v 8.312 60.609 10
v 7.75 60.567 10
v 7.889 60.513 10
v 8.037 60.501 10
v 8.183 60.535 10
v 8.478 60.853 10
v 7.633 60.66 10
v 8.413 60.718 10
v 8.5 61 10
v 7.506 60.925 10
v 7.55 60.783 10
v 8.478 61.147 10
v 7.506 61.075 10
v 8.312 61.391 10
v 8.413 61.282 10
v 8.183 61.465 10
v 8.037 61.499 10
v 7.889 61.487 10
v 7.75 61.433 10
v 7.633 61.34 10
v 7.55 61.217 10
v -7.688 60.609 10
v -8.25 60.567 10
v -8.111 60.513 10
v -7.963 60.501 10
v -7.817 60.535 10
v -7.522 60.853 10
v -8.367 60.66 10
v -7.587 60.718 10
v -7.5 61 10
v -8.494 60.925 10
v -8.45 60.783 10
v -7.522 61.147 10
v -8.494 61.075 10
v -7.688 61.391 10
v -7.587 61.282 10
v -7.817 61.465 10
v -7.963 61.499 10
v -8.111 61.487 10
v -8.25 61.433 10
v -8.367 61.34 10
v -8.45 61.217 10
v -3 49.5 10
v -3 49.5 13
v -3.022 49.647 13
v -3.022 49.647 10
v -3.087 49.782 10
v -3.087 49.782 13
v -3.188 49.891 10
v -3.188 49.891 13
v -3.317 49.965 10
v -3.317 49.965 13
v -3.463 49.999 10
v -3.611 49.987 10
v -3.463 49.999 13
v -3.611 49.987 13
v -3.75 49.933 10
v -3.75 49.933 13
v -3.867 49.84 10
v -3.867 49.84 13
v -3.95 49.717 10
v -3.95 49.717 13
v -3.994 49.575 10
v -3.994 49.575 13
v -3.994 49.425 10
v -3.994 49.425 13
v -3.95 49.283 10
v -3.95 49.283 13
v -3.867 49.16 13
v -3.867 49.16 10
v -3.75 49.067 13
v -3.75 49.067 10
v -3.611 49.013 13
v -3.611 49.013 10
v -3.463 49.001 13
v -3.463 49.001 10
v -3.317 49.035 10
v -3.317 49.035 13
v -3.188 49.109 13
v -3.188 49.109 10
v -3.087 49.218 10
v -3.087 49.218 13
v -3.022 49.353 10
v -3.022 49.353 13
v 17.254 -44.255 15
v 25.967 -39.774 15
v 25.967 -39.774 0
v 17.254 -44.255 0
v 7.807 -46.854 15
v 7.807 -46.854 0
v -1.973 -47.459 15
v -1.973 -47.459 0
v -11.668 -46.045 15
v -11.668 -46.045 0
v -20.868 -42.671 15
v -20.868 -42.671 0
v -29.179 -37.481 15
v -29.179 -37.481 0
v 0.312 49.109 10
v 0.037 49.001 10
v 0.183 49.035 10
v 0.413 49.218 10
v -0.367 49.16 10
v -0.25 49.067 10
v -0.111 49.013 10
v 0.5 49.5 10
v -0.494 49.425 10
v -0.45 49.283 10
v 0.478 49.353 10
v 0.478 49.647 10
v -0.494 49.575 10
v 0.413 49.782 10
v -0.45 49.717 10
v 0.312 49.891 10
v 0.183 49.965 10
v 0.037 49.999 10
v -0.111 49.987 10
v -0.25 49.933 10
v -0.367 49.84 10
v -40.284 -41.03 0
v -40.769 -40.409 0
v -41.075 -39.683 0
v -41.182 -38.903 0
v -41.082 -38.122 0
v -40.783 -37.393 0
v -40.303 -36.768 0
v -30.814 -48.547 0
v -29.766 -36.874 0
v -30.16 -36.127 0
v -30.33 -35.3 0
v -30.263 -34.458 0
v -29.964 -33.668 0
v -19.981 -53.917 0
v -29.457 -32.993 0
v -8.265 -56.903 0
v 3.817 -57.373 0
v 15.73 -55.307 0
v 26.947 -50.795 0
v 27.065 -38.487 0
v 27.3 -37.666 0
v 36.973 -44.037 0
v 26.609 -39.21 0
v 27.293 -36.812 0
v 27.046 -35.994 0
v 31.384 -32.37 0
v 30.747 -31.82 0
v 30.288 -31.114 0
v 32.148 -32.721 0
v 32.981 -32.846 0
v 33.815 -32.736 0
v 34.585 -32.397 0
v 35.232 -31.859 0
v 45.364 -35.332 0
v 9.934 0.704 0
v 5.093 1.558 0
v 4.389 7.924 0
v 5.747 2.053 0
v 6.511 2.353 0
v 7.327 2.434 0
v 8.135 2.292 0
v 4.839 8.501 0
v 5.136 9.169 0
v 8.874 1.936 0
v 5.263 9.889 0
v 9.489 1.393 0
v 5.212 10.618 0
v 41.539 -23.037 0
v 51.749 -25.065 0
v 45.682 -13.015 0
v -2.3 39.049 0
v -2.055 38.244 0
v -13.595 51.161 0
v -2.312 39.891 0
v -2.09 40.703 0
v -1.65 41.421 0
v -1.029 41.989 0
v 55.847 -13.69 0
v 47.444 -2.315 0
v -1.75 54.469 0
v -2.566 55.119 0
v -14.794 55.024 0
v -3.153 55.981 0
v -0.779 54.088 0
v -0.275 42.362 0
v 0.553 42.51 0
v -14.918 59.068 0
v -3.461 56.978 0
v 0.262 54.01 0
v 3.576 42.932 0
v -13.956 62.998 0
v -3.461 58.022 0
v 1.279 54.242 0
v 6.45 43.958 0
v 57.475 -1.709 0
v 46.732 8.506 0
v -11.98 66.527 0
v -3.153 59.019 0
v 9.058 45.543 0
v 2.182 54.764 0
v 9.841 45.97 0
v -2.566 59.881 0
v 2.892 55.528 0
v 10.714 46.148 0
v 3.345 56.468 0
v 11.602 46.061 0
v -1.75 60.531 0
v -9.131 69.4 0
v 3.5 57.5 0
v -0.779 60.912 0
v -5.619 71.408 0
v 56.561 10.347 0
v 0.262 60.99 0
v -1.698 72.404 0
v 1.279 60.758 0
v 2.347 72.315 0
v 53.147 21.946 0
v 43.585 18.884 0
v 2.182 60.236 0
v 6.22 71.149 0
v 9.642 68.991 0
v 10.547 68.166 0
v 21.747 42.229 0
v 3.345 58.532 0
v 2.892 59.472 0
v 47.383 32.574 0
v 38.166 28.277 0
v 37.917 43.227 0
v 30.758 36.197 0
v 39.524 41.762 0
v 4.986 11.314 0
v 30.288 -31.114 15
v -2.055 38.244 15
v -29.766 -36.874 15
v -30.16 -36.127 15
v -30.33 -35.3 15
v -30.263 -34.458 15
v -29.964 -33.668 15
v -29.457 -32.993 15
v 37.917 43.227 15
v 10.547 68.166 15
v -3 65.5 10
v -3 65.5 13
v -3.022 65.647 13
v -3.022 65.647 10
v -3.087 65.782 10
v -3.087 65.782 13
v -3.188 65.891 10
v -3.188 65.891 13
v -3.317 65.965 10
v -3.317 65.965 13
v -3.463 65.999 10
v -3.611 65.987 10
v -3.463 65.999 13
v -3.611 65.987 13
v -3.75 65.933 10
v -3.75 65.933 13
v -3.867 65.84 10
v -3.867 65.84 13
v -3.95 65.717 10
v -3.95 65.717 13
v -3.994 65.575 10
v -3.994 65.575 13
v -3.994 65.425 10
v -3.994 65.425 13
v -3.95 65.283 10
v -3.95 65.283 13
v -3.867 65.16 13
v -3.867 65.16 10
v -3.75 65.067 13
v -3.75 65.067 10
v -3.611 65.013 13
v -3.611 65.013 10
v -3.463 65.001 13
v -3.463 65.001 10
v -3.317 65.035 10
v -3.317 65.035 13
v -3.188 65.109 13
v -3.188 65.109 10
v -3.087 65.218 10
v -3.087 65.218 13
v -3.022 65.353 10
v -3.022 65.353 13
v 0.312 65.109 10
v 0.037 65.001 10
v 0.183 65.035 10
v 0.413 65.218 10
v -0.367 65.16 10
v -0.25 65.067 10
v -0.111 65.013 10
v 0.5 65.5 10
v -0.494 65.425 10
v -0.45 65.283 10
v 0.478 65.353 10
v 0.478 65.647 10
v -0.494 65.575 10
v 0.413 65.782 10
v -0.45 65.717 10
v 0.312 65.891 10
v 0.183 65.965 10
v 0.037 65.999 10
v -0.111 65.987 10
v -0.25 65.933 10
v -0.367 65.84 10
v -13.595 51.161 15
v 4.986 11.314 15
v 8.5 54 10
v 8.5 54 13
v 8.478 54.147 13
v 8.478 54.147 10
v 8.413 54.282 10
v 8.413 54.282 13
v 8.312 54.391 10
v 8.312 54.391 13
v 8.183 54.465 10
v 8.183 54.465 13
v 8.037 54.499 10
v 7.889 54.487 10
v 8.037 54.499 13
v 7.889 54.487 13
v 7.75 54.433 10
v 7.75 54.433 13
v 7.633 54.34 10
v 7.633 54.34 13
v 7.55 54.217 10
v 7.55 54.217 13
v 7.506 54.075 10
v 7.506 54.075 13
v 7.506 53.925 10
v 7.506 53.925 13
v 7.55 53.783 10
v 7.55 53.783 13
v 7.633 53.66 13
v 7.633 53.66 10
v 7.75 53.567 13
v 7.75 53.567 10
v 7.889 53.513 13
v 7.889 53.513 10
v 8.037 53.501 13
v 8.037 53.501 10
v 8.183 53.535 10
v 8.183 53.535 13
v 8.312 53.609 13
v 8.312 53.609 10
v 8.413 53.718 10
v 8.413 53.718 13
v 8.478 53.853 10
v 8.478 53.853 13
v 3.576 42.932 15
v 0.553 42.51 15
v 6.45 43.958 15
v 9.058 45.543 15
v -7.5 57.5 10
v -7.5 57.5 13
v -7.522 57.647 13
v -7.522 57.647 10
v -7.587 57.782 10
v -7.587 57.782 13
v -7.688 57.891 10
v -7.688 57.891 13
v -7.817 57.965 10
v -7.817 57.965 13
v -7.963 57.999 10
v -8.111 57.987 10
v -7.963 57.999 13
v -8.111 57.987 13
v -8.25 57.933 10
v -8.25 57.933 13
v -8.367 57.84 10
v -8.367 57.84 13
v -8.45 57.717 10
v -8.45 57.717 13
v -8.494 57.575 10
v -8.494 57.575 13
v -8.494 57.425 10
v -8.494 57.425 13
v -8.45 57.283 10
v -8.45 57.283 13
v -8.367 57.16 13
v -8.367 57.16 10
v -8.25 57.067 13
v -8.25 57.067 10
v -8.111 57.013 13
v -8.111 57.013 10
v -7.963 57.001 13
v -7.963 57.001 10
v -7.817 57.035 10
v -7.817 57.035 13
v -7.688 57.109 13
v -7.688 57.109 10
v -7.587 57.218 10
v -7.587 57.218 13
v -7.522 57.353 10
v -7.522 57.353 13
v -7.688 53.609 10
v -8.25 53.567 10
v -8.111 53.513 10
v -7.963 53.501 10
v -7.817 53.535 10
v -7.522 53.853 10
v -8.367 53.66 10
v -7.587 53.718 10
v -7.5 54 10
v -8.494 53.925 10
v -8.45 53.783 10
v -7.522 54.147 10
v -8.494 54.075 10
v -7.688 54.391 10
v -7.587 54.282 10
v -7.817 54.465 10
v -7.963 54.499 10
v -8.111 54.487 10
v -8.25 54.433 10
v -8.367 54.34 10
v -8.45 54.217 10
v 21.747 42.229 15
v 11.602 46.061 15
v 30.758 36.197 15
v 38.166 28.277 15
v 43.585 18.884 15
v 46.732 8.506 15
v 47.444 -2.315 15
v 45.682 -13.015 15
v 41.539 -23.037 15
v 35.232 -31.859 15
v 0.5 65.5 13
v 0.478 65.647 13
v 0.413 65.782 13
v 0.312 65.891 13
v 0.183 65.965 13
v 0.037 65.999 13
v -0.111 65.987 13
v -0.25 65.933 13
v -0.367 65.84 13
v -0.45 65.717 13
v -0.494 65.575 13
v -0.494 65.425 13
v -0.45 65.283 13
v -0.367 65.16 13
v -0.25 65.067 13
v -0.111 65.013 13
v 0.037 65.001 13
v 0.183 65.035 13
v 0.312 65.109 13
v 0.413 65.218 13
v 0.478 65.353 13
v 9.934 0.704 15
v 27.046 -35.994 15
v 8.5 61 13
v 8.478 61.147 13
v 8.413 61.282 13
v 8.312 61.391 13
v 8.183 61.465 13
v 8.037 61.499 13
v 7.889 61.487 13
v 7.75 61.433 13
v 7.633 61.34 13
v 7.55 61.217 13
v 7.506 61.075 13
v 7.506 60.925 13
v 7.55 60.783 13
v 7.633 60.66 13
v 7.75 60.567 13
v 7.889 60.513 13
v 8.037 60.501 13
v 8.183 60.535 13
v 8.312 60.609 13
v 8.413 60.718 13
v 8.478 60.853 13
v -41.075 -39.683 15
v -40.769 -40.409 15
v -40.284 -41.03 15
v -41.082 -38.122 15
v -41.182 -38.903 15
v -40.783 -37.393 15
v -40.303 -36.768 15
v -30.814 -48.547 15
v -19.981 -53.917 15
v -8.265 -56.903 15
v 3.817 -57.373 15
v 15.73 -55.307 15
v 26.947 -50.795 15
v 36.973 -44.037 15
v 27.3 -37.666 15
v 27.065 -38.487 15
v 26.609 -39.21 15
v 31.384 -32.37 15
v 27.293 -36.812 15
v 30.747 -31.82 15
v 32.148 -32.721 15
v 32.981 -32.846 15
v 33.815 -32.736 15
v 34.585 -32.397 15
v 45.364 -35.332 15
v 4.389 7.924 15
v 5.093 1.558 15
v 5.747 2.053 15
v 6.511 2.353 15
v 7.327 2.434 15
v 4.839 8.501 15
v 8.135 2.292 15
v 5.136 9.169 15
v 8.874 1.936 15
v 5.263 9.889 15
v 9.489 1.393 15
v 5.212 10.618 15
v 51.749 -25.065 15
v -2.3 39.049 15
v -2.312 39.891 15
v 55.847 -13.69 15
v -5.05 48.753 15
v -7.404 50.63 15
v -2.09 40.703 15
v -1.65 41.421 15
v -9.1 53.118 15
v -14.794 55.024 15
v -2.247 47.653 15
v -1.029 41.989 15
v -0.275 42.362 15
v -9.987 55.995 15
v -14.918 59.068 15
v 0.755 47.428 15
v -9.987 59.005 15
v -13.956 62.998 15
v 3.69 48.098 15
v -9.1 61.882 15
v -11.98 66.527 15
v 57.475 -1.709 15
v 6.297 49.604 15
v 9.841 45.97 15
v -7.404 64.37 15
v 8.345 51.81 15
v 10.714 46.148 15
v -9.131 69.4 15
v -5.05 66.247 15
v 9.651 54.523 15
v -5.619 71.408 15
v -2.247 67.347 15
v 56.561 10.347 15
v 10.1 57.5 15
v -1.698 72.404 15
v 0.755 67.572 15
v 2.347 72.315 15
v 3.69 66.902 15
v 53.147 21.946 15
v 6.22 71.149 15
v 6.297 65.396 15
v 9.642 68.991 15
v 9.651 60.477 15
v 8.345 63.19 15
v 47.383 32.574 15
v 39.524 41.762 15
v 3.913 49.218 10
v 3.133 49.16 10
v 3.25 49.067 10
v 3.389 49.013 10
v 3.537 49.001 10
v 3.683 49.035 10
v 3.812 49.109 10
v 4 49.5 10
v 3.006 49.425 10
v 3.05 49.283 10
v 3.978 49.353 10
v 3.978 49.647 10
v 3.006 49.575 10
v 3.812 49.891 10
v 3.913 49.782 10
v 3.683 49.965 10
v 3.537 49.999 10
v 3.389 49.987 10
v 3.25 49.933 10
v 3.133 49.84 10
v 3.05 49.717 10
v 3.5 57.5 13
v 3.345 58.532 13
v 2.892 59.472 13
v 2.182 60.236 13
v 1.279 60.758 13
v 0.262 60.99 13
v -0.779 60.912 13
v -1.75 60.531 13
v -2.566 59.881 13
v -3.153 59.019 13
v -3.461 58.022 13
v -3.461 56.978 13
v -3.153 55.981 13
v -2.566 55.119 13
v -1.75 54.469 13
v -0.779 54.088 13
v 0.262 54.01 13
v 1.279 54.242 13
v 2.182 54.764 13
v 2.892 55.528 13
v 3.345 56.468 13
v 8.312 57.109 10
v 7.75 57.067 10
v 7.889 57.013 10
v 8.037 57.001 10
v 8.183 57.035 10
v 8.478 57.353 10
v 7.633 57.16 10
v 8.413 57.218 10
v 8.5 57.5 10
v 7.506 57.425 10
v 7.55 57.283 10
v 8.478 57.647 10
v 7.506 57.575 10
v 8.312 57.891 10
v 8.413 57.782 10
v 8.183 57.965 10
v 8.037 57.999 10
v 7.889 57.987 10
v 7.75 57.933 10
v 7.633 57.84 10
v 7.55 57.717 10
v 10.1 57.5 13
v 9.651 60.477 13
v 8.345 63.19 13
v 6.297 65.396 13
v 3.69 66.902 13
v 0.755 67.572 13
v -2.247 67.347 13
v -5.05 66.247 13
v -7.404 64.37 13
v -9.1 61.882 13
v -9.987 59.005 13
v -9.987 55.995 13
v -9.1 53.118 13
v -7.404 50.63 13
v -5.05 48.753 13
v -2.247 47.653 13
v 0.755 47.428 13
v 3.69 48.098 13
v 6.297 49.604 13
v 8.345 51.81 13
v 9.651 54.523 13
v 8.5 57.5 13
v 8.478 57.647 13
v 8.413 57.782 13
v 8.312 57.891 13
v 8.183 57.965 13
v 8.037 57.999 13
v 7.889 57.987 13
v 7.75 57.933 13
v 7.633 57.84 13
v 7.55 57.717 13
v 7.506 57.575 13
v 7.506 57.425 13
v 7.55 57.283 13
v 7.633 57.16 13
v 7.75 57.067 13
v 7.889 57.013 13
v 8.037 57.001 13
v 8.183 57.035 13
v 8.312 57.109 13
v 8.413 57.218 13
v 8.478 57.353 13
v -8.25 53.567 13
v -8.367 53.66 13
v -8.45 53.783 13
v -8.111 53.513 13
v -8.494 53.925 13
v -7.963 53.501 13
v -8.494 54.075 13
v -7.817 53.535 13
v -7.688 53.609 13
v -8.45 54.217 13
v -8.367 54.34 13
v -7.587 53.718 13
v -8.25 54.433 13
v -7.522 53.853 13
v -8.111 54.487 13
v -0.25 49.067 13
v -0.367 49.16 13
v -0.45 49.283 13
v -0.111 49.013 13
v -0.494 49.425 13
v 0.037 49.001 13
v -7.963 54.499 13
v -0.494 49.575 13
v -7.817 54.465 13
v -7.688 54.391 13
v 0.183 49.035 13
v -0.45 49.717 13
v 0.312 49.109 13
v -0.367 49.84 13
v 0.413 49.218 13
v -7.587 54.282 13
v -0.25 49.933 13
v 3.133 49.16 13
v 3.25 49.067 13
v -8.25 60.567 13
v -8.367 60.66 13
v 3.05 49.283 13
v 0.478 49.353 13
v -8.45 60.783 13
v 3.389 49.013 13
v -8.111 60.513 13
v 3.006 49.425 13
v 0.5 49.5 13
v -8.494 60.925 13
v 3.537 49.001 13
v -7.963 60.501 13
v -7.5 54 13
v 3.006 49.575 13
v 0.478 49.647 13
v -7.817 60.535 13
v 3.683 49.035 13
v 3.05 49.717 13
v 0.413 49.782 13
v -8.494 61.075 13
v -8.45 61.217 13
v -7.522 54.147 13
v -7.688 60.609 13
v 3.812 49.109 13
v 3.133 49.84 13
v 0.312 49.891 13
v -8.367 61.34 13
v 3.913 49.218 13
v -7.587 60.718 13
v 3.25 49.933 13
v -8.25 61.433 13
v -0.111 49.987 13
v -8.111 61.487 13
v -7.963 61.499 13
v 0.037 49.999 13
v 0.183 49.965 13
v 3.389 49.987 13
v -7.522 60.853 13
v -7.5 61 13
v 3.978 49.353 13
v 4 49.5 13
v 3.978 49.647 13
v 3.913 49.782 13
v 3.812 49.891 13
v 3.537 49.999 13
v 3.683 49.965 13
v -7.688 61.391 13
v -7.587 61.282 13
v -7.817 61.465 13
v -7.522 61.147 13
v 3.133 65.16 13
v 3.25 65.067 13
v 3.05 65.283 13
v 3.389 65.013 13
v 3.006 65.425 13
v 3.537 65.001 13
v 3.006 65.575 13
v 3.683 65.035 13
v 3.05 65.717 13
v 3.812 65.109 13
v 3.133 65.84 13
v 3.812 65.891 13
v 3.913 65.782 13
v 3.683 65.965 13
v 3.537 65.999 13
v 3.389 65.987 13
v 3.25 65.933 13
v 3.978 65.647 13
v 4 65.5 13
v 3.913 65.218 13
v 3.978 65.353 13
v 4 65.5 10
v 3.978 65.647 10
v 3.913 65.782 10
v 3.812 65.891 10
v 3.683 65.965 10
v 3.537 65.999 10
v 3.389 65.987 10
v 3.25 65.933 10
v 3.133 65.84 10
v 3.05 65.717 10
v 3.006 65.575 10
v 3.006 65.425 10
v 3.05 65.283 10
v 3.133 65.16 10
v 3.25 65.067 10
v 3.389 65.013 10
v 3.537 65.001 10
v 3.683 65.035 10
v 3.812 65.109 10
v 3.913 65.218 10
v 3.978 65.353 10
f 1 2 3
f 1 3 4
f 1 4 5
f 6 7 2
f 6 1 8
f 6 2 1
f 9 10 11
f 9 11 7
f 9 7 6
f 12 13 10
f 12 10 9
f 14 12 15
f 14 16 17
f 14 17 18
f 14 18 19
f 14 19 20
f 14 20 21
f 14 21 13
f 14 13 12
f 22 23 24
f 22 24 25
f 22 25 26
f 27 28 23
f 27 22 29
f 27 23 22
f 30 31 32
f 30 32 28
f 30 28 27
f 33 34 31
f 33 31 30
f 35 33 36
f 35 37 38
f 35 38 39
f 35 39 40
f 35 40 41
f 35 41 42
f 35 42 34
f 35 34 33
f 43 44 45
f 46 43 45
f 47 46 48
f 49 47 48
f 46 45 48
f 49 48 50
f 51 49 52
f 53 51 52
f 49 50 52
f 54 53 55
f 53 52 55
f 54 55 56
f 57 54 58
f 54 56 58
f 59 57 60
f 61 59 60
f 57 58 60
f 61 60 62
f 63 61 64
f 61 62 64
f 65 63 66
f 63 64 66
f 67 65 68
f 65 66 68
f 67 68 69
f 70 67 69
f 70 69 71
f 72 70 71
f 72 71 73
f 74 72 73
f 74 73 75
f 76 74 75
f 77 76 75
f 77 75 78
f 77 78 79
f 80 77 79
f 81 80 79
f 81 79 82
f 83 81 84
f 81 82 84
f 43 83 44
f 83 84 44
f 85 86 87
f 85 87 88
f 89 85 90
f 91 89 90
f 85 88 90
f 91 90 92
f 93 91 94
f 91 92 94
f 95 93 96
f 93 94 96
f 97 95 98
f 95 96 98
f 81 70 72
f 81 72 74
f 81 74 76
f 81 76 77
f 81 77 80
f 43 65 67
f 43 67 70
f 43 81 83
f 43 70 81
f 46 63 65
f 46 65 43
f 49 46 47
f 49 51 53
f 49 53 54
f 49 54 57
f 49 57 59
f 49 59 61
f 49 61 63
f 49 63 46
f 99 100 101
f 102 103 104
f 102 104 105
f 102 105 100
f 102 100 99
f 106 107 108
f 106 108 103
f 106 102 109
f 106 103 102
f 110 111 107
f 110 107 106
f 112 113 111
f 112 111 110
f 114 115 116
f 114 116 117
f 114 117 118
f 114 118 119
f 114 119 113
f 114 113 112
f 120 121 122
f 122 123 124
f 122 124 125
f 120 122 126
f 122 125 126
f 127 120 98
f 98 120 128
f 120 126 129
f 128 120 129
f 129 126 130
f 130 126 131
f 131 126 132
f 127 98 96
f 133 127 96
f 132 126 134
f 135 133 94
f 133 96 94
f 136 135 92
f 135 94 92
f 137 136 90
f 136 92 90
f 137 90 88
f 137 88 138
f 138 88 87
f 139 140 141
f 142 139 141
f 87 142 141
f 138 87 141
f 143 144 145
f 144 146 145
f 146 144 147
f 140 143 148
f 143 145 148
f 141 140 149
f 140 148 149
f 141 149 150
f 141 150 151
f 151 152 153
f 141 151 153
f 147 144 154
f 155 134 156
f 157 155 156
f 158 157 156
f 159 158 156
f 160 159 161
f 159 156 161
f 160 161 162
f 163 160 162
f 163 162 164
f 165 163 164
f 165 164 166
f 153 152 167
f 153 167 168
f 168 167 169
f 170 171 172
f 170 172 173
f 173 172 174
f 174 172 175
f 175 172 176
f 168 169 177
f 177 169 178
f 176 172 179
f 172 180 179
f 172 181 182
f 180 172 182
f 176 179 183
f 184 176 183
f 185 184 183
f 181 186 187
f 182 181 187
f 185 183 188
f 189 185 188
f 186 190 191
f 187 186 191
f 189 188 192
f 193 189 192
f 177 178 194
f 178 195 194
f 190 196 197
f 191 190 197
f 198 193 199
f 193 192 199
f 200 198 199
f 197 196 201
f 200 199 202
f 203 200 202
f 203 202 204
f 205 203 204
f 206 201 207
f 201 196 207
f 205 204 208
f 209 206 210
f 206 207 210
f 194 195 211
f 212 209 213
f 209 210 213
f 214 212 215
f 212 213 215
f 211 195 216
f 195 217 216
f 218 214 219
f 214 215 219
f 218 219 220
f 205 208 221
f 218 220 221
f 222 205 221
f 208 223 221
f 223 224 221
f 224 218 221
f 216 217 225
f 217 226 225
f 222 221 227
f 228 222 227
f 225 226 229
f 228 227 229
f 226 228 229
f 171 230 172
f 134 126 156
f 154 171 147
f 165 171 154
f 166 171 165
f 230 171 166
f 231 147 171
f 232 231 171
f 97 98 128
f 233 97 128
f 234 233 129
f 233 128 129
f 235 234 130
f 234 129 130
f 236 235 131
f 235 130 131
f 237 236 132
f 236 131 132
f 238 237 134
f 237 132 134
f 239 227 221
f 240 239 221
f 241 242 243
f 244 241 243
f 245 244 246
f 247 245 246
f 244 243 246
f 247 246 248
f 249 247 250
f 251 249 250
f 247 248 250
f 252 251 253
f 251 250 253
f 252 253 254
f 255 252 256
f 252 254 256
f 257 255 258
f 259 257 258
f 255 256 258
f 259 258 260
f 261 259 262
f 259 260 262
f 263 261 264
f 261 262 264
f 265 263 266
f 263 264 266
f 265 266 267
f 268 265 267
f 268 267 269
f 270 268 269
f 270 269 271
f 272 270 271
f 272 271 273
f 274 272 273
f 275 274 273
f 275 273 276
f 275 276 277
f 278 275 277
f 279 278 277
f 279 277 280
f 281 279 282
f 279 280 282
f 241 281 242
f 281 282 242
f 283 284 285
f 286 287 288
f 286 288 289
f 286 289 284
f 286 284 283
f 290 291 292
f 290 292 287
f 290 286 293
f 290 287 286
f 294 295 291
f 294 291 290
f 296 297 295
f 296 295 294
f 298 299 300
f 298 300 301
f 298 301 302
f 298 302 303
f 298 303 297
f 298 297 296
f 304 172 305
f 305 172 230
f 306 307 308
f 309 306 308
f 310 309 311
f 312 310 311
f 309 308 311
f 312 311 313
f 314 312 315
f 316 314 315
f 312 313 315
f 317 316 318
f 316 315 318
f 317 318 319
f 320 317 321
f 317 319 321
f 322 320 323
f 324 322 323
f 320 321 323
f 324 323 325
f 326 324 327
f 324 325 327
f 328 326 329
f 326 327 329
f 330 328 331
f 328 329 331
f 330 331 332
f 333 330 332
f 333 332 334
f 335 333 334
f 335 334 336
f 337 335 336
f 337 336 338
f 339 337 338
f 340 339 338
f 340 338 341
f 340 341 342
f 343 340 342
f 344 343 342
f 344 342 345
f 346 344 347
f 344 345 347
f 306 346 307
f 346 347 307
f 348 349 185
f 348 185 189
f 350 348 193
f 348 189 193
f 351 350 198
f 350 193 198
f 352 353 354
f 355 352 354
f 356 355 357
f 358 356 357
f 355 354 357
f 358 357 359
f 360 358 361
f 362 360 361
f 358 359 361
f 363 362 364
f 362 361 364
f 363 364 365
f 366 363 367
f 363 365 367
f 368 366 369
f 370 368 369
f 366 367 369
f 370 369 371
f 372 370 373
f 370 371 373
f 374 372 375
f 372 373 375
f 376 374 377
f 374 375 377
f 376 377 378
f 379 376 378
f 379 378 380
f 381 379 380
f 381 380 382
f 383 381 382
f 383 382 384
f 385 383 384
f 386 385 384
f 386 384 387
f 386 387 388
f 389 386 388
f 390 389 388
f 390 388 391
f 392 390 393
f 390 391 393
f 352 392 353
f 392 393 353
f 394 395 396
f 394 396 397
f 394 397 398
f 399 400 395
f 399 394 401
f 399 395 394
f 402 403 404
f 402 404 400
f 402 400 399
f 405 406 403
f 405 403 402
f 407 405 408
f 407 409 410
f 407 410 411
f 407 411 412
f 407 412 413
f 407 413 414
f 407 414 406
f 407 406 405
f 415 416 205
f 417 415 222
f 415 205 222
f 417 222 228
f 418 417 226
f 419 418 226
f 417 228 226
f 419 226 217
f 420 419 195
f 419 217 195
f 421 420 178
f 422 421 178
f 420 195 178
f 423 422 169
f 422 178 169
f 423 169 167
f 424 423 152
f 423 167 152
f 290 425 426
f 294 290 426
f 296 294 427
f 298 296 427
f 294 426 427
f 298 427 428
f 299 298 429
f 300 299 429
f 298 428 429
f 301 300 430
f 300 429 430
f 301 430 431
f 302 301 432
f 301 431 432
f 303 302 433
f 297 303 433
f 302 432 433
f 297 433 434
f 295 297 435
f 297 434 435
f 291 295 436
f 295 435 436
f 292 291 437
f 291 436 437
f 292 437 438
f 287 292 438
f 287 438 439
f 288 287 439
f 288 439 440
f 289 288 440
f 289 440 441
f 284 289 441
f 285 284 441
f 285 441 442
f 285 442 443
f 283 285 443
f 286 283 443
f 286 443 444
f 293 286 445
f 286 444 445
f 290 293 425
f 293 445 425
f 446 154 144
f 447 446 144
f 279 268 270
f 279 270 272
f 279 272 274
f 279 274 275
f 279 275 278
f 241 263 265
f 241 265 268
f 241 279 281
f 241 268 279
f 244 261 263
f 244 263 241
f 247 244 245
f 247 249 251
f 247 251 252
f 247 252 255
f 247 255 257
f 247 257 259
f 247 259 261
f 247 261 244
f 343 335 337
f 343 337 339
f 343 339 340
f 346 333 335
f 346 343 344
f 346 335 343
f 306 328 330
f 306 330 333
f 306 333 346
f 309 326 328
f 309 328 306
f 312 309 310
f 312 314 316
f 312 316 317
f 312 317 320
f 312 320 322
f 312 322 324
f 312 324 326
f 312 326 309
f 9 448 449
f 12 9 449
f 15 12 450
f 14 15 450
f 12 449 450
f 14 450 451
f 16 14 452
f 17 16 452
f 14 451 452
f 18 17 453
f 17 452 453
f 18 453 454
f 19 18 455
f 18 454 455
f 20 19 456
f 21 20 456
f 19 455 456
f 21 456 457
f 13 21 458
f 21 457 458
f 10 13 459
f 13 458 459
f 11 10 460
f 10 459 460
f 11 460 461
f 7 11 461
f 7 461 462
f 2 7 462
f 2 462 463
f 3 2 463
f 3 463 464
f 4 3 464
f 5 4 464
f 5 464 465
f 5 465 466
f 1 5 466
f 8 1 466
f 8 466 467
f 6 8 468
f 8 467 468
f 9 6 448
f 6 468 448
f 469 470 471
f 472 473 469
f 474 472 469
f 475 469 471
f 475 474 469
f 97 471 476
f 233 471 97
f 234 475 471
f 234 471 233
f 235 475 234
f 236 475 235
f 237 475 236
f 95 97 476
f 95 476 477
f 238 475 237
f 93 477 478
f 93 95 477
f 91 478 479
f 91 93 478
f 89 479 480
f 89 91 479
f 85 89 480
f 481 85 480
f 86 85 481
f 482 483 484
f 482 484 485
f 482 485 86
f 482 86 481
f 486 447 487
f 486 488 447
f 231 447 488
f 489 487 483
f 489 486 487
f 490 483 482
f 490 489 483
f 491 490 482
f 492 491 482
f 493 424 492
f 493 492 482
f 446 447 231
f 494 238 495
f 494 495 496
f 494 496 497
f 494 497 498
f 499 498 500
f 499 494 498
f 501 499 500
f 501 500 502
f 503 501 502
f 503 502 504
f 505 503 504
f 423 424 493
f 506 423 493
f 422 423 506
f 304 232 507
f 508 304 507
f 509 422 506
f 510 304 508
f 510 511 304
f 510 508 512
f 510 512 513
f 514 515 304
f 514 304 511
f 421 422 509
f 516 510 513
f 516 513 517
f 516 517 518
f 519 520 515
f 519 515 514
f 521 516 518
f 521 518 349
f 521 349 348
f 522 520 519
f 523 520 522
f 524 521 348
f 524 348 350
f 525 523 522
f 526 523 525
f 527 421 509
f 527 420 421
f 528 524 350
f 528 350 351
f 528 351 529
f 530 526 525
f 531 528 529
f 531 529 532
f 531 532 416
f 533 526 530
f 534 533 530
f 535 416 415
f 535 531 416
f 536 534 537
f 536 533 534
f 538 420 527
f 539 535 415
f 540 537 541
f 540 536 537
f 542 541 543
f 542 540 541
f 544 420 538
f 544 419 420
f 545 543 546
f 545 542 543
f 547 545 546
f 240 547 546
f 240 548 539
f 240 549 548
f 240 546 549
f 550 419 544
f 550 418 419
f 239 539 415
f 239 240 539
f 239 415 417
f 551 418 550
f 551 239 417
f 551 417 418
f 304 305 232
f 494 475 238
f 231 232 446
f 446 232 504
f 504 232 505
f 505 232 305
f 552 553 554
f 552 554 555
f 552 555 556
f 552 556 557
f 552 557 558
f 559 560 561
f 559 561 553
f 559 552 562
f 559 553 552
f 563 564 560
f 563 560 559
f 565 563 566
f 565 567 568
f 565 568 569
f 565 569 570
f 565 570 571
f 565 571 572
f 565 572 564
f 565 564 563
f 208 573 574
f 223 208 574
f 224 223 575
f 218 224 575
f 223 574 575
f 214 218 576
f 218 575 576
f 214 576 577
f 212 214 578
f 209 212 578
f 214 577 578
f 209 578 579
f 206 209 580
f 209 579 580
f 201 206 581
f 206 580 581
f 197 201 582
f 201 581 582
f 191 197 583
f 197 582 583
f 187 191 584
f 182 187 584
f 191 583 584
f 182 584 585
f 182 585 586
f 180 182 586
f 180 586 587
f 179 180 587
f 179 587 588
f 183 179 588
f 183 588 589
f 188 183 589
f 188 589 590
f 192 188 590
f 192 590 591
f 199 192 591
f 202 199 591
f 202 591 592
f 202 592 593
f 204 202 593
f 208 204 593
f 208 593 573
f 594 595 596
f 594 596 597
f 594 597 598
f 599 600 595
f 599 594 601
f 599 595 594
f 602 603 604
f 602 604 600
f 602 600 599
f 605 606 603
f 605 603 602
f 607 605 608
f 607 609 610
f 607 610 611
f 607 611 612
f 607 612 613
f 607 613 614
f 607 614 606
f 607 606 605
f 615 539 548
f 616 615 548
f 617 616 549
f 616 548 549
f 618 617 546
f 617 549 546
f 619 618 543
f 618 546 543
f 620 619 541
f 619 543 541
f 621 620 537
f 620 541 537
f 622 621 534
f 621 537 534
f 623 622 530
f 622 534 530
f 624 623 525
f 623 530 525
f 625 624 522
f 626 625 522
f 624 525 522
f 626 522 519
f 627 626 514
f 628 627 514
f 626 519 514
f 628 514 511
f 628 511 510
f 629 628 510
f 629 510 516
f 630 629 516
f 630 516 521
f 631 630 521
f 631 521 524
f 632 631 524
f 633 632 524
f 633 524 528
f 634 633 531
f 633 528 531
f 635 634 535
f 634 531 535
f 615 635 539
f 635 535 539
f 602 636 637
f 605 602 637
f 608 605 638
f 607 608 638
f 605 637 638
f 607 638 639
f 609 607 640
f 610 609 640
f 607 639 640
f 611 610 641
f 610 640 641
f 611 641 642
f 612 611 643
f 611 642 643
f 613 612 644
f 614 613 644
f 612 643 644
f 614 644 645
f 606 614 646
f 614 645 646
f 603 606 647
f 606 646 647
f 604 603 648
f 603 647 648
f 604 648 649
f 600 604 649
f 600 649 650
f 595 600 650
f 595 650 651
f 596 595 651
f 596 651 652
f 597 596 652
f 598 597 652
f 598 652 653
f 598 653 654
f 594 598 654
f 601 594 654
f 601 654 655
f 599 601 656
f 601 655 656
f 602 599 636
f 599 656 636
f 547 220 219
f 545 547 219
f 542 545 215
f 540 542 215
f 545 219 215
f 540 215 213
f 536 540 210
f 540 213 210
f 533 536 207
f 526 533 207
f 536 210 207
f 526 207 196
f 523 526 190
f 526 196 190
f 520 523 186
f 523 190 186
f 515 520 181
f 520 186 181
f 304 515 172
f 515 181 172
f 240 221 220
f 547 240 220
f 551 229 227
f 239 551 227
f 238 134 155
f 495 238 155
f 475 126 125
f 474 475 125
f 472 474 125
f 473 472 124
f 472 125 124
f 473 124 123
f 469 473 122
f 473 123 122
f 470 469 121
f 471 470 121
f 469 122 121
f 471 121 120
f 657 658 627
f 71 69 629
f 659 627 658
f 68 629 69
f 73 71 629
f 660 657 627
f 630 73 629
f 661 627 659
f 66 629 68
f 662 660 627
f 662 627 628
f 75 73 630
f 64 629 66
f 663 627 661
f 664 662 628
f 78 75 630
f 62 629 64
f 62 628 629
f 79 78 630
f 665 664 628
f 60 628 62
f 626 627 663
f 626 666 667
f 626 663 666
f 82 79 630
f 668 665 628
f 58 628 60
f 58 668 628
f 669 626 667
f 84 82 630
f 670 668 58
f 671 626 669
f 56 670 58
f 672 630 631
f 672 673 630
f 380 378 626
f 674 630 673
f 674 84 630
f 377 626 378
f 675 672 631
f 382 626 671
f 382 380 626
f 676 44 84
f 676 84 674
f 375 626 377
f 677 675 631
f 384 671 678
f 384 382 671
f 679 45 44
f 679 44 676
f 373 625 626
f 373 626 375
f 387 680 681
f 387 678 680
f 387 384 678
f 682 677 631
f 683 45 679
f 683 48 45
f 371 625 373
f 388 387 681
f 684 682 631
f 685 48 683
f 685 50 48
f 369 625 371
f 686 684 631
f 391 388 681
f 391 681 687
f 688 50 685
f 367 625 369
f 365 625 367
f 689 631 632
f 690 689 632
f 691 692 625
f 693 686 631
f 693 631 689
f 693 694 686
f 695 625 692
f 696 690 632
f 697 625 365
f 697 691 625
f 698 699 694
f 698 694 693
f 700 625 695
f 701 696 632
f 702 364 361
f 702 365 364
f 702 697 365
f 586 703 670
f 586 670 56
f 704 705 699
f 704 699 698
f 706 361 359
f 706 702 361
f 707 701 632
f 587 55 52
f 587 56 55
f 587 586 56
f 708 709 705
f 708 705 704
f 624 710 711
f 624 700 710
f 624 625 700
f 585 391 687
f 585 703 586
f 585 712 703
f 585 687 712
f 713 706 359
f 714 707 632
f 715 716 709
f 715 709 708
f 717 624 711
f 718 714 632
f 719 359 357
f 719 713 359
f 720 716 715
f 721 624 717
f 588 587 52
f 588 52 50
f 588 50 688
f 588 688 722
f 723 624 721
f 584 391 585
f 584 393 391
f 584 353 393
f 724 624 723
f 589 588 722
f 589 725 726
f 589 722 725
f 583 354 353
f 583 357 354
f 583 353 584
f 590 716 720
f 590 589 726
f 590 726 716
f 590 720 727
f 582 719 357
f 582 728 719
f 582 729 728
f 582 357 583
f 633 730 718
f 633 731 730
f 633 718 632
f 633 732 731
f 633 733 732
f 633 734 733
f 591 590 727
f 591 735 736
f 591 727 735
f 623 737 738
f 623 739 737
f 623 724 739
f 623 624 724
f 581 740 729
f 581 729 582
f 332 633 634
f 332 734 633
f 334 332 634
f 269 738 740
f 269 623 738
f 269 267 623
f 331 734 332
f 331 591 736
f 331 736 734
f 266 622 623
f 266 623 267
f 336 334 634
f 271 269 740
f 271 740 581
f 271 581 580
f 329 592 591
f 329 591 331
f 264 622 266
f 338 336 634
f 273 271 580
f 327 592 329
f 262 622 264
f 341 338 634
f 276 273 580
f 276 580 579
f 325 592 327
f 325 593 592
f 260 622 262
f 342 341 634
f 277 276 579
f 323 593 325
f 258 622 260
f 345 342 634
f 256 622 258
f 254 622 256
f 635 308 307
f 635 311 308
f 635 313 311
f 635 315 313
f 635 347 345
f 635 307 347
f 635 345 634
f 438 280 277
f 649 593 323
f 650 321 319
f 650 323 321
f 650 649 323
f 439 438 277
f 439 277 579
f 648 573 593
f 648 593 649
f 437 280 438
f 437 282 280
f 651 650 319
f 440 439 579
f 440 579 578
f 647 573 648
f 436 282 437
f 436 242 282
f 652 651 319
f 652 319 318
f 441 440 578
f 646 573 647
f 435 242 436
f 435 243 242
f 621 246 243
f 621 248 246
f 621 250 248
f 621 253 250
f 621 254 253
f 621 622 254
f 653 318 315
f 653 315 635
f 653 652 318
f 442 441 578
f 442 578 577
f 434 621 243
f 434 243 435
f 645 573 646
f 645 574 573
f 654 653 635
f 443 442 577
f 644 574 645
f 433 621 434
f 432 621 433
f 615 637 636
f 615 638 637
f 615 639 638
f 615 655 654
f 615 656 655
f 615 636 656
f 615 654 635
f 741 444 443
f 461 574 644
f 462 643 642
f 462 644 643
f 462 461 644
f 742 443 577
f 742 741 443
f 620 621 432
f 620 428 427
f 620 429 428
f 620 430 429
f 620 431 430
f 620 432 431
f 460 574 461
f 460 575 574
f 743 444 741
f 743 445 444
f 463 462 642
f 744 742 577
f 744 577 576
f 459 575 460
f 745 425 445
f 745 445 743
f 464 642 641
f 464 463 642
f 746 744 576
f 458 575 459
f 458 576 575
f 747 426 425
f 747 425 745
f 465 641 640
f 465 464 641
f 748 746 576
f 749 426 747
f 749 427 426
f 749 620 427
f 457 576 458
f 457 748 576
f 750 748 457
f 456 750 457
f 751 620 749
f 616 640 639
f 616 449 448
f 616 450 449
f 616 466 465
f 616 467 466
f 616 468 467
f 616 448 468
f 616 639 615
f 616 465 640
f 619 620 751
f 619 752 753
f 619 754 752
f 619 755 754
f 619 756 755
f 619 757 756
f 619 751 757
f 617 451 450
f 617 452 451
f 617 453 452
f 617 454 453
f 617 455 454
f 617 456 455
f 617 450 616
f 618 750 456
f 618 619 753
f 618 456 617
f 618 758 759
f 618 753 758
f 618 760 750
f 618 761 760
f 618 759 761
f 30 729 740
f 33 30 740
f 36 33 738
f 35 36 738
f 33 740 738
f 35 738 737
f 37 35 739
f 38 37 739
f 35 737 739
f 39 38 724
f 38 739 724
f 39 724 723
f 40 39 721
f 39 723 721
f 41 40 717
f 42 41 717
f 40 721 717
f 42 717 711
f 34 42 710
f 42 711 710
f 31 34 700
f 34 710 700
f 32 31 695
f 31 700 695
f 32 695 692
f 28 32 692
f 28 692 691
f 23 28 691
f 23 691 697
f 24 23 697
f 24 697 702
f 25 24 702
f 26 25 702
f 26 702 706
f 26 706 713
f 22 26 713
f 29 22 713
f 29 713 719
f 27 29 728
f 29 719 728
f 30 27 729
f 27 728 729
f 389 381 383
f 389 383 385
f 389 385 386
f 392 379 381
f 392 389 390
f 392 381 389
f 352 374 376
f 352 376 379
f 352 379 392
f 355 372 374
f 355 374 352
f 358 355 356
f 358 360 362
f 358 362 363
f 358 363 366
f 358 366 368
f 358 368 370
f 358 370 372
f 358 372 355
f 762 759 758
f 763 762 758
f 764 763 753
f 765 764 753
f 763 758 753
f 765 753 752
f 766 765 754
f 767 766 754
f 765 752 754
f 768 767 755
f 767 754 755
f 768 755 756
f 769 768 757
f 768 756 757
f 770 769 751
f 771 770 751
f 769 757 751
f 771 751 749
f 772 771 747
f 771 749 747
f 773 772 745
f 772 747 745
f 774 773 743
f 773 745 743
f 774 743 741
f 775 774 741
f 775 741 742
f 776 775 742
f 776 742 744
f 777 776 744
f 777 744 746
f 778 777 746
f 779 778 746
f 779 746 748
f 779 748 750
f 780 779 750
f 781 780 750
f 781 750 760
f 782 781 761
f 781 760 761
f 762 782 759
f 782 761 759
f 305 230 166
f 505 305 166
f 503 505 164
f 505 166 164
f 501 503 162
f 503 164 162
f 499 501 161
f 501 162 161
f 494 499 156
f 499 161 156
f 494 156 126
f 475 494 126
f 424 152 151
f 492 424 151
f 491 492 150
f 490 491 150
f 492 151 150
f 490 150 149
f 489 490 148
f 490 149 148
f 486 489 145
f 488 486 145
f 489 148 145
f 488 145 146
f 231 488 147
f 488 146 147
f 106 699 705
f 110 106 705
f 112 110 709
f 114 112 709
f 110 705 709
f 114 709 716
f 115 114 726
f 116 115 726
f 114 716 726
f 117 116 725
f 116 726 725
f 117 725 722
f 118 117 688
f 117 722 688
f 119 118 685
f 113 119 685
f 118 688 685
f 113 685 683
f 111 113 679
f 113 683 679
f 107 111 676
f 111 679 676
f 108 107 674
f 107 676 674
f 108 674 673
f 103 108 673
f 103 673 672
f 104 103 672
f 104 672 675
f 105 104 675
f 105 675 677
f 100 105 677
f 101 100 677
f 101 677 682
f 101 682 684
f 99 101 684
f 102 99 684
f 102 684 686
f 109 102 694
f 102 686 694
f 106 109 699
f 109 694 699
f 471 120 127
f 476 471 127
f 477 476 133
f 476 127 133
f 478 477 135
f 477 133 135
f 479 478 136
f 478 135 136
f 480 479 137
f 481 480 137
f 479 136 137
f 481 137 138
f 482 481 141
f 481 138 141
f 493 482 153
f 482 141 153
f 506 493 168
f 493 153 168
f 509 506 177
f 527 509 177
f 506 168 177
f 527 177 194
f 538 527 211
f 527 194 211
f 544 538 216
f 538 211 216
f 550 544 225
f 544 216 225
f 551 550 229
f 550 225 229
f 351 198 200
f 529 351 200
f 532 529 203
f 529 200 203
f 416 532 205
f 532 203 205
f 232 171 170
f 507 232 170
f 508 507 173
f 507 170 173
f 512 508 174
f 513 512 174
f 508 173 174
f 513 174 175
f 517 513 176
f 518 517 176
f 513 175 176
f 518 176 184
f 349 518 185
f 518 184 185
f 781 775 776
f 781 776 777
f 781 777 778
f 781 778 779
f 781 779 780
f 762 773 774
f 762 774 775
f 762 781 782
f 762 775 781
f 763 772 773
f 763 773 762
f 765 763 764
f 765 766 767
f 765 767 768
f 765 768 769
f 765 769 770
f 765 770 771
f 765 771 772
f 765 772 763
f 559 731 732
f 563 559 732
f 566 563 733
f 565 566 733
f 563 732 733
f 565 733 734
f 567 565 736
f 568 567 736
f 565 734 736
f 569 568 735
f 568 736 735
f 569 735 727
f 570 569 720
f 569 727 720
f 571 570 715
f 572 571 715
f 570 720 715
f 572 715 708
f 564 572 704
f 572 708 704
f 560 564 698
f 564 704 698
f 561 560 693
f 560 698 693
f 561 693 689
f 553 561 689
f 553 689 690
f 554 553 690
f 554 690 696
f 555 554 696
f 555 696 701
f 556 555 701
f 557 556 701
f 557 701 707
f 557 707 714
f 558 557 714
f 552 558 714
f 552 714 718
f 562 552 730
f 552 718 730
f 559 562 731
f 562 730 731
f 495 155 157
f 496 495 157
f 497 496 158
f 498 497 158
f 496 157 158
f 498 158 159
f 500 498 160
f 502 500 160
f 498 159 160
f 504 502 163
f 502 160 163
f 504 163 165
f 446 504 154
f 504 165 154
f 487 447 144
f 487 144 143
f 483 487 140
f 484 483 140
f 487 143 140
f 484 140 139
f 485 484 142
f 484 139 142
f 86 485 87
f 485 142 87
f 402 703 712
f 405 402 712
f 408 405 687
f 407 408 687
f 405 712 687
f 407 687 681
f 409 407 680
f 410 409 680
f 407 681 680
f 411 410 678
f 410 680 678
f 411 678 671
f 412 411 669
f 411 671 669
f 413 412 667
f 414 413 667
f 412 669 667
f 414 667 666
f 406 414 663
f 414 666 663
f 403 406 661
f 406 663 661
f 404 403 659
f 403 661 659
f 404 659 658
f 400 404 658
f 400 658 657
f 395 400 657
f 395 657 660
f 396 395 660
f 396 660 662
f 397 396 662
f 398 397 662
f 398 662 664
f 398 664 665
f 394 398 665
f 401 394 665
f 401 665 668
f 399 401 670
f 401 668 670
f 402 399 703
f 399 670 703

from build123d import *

# Parameters (mm, degrees)
EXTRUDE_1_DEPTH     = 15
SKETCH_6_R          = 3.5
CUT_EXTRUDE_2_DEPTH = 15
SKETCH_7_R          = 10.1
CUT_EXTRUDE_3_DEPTH = 2
SKETCH_8_R          = 0.5
CUT_EXTRUDE_4_DEPTH = 3


with BuildPart() as part:
    # ｽｹｯﾁ1 → ﾎﾞｽ - 押し出し1 (new body)
    with BuildSketch(Plane.XY):
        with BuildLine():
            Line((10.546944731, 68.165925034), (9.641814145, 68.990666647))
            ThreePointArc((9.641814145, 68.990666647), (-9.131421435, 69.400300104), (-13.594616806, 51.160726074))
            Line((-13.594616806, 51.160726074), (4.986432096, 11.313538113))
            ThreePointArc((4.986432096, 11.313538113), (5.221931994, 9.524738795), (4.388829079, 7.924362985))
            Line((4.388829079, 7.924362985), (-40.303464689, -36.767930783))
            ThreePointArc((-40.303464689, -36.767930783), (-41.182112782, -38.903012739), (-40.283913759, -41.029943849))
            ThreePointArc((-40.283913759, -41.029943849), (41.397896806, -39.905690573), (39.524106652, 41.762363359))
            Line((39.524106652, 41.762363359), (37.916838192, 43.226882625))
            Line((37.916838192, 43.226882625), (10.546944731, 68.165925034))
        make_face()
        with BuildLine():
            ThreePointArc((5.093338956, 1.55780505), (7.735603832, 2.390907965), (9.933582661, 0.704339492))
            Line((9.933582661, 0.704339492), (27.046217634, -35.993824637))
            ThreePointArc((27.046217634, -35.993824637), (27.212084573, -38.085077821), (25.967336583, -39.773702754))
            ThreePointArc((25.967336583, -39.773702754), (-1.972837213, -47.459012983), (-29.17877254, -37.481318454))
            ThreePointArc((-29.17877254, -37.481318454), (-30.330146685, -35.299826939), (-29.457223039, -32.992756945))
            Line((-29.457223039, -32.992756945), (5.093338956, 1.55780505))
        make_face(mode=Mode.SUBTRACT)
        with BuildLine():
            ThreePointArc((35.231836325, -31.858557864), (32.560090836, -32.813013733), (30.287744354, -31.114293205))
            Line((30.287744354, -31.114293205), (-2.054746852, 38.244403012))
            ThreePointArc((-2.054746852, 38.244403012), (-1.895310582, 41.077194163), (0.553480425, 42.510214831))
            ThreePointArc((0.553480425, 42.510214831), (5.039223996, 43.371793408), (9.057681155, 45.543478261))
            ThreePointArc((9.057681155, 45.543478261), (10.270904088, 46.091905397), (11.601973614, 46.061309233))
            ThreePointArc((11.601973614, 46.061309233), (45.455779175, 13.784851815), (35.231836325, -31.858557864))
        make_face(mode=Mode.SUBTRACT)
    extrude(amount=EXTRUDE_1_DEPTH)

    # ｽｹｯﾁ6 → ｶｯﾄ - 押し出し2 (cut)
    with BuildSketch(Plane.XY.offset(15)):
        with Locations((0, 57.5)):
            Circle(SKETCH_6_R)
    extrude(amount=-CUT_EXTRUDE_2_DEPTH, mode=Mode.SUBTRACT)

    # ｽｹｯﾁ7 → ｶｯﾄ - 押し出し3 (cut)
    with BuildSketch(Plane.XY.offset(15)):
        with Locations((0, 57.5)):
            Circle(SKETCH_7_R)
    extrude(amount=-CUT_EXTRUDE_3_DEPTH, mode=Mode.SUBTRACT)

    # ｽｹｯﾁ8 → ｶｯﾄ - 押し出し4 (cut)
    with BuildSketch(Plane.XY.offset(13)):
        with Locations((-3.5, 65.5)):
            Circle(SKETCH_8_R)
        with Locations((0, 65.5)):
            Circle(SKETCH_8_R)
        with Locations((3.5, 65.5)):
            Circle(SKETCH_8_R)
        with Locations((8, 57.5)):
            Circle(SKETCH_8_R)
        with Locations((8, 61)):
            Circle(SKETCH_8_R)
        with Locations((8, 54)):
            Circle(SKETCH_8_R)
        with Locations((0, 49.5)):
            Circle(SKETCH_8_R)
        with Locations((3.5, 49.5)):
            Circle(SKETCH_8_R)
        with Locations((-3.5, 49.5)):
            Circle(SKETCH_8_R)
        with Locations((-8, 57.5)):
            Circle(SKETCH_8_R)
        with Locations((-8, 54)):
            Circle(SKETCH_8_R)
        with Locations((-8, 61)):
            Circle(SKETCH_8_R)
    extrude(amount=-CUT_EXTRUDE_4_DEPTH, mode=Mode.SUBTRACT)


solid = part.part
